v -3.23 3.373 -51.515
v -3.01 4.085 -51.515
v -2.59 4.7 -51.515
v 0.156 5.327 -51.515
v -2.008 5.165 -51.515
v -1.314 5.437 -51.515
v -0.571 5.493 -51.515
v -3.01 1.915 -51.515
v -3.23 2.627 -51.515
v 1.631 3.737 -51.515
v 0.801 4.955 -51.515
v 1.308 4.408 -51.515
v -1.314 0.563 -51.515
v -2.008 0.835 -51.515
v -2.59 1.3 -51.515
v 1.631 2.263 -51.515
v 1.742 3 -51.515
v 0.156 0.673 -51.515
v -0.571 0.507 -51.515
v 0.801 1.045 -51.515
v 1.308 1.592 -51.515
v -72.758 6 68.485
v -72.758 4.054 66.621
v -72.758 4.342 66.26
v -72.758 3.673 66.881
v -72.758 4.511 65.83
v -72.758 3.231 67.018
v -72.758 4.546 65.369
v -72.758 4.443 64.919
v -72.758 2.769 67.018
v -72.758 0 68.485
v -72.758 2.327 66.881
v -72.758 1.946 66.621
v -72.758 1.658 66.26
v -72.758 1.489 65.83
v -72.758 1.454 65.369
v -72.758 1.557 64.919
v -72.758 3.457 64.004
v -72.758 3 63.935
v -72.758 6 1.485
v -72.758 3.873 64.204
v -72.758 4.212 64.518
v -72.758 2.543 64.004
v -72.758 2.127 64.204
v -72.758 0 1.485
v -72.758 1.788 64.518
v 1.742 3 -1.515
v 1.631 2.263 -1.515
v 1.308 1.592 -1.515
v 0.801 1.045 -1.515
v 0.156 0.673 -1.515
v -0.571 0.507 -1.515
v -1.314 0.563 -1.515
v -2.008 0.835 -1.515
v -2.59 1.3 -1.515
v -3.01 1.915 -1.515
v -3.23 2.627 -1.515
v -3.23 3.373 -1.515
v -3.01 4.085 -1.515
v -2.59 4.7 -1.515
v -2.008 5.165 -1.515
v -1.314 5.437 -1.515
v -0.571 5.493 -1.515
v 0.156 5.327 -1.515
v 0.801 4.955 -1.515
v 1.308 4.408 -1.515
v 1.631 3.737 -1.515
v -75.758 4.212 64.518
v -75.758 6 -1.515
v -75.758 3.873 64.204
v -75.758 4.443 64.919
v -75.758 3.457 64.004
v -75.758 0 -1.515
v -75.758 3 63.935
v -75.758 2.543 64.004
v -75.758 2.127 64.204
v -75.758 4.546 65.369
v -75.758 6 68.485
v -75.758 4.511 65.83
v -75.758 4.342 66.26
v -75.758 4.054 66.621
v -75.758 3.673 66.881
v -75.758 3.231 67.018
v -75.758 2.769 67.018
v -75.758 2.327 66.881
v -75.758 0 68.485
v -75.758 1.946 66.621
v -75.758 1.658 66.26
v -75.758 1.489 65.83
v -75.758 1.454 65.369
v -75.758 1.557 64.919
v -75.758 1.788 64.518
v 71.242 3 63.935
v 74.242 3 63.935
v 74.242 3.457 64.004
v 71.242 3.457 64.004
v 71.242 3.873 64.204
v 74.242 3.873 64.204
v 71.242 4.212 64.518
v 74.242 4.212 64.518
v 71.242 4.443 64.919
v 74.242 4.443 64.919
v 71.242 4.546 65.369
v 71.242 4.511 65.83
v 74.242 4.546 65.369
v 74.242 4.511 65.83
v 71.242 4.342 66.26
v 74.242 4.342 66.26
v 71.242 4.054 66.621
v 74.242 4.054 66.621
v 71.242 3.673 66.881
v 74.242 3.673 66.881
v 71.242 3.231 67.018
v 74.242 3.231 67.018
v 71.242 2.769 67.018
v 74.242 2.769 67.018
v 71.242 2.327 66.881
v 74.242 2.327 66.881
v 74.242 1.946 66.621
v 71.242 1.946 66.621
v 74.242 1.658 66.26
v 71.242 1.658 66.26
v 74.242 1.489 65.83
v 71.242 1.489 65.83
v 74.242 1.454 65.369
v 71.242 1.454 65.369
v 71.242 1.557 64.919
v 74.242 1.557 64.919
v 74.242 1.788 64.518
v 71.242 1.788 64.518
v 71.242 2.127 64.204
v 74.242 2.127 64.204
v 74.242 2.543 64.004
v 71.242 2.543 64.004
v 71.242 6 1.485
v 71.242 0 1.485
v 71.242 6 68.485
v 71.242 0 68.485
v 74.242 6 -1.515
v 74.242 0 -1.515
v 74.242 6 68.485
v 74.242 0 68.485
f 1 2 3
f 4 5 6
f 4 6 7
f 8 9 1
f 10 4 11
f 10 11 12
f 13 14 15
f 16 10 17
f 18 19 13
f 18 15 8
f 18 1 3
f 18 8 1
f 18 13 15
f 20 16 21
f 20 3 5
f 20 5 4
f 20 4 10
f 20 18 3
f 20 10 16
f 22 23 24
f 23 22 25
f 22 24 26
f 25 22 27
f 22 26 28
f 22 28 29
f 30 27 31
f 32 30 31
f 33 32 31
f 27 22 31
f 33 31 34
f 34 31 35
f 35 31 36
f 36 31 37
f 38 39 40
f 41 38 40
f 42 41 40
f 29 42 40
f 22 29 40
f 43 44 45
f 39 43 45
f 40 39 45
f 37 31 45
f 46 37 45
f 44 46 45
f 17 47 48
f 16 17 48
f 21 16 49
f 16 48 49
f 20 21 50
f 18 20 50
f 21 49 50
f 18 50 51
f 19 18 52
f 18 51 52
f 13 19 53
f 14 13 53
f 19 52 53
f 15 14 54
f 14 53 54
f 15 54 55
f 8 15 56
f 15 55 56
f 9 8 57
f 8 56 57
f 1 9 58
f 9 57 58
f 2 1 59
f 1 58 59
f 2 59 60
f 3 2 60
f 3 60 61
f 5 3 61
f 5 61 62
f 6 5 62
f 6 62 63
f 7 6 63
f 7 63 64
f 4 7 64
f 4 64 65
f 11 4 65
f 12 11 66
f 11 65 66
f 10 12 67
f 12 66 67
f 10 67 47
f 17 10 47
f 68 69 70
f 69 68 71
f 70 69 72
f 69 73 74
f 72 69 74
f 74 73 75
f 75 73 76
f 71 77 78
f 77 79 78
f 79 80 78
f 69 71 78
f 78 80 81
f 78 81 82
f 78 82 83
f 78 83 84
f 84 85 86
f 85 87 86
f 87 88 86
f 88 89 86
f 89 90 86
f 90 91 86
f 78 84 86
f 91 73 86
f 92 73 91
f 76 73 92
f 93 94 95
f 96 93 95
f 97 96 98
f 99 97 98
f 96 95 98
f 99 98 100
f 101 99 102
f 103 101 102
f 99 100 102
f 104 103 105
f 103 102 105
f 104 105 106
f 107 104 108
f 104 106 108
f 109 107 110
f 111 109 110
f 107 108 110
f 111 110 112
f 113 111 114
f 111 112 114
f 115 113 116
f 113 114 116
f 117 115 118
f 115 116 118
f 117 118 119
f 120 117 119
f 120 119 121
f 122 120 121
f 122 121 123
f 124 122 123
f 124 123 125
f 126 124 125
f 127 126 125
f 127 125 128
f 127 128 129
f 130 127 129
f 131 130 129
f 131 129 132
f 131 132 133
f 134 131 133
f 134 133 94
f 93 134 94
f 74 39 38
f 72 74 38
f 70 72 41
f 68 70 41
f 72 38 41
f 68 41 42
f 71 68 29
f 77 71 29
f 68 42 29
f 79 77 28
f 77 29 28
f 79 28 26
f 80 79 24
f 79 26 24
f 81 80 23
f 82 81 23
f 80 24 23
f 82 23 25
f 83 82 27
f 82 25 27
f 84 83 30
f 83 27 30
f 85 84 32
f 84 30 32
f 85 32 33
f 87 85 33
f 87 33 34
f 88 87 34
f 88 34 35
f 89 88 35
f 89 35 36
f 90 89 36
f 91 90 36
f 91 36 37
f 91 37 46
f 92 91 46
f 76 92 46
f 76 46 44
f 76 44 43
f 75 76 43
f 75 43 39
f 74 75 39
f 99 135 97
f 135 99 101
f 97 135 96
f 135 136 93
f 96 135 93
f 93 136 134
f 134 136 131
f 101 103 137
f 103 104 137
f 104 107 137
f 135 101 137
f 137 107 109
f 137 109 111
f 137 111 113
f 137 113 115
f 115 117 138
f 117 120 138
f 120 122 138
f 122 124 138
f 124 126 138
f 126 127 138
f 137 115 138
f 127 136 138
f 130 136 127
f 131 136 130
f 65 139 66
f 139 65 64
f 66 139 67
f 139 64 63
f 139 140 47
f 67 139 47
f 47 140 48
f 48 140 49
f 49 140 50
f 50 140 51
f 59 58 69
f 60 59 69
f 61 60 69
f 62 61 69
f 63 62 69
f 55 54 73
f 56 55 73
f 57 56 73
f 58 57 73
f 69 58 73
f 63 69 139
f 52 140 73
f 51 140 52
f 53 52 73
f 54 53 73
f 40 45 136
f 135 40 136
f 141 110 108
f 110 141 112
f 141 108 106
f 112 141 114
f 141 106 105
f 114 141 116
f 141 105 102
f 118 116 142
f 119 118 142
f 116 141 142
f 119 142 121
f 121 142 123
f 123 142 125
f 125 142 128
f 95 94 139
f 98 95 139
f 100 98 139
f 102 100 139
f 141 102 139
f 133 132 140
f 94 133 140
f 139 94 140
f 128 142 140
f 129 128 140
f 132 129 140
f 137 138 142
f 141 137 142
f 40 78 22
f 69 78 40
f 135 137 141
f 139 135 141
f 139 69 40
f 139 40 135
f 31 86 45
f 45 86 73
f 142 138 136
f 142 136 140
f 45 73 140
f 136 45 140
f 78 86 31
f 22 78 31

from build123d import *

# Parameters (mm, degrees)
EXTRUDE_2_DEPTH     = 6
SKETCH_2_R          = 1.55
CUT_EXTRUDE_1_DEPTH = 10
SKETCH_3_R          = 1.55
CUT_EXTRUDE_2_DEPTH = 10
SKETCH_5_R          = 2.5
EXTRUDE_3_DEPTH     = 50


with BuildPart() as part:
    # 草图1 → 凸台-拉伸2 (new body)
    with BuildSketch(Plane(origin=(0, 0, 0), x_dir=(1, 0, 0), z_dir=(0, 1, 0))):
        Polygon((-72.757575758, -68.484848485), (-72.757575758, -1.484848485), (71.242424242, -1.484848485), (71.242424242, -68.484848485), (74.242424242, -68.484848485), (74.242424242, -1.484848485), (74.242424242, 1.515151515), (71.242424242, 1.515151515), (-72.757575758, 1.515151515), (-75.757575758, 1.515151515), (-75.757575758, -1.484848485), (-75.757575758, -68.484848485), align=None)
    extrude(amount=EXTRUDE_2_DEPTH)

    # 草图2 → 切除-拉伸1 (cut)
    with BuildSketch(Plane(origin=(-72.757575758, 0, 0), x_dir=(0, 0, -1), z_dir=(1, 0, 0))):
        with Locations((-65.484848485, 3)):
            Circle(SKETCH_2_R)
    extrude(amount=-CUT_EXTRUDE_1_DEPTH, mode=Mode.SUBTRACT)

    # 草图3 → 切除-拉伸2 (cut)
    with BuildSketch(Plane(origin=(74.242424242, 0, 0), x_dir=(0, 0, -1), z_dir=(1, 0, 0))):
        with Locations((-65.484848485, 3)):
            Circle(SKETCH_3_R)
    extrude(amount=-CUT_EXTRUDE_2_DEPTH, mode=Mode.SUBTRACT)

    # 草图5 → 凸台-拉伸3 (add)
    with BuildSketch(Plane(origin=(0, 0, -1.515151515), x_dir=(-1, 0, 0), z_dir=(0, 0, -1))):
        with Locations(Location((0.757575758, 3, 0), (0, 0, 180))):
            Circle(SKETCH_5_R)
    extrude(amount=EXTRUDE_3_DEPTH)


solid = part.part
